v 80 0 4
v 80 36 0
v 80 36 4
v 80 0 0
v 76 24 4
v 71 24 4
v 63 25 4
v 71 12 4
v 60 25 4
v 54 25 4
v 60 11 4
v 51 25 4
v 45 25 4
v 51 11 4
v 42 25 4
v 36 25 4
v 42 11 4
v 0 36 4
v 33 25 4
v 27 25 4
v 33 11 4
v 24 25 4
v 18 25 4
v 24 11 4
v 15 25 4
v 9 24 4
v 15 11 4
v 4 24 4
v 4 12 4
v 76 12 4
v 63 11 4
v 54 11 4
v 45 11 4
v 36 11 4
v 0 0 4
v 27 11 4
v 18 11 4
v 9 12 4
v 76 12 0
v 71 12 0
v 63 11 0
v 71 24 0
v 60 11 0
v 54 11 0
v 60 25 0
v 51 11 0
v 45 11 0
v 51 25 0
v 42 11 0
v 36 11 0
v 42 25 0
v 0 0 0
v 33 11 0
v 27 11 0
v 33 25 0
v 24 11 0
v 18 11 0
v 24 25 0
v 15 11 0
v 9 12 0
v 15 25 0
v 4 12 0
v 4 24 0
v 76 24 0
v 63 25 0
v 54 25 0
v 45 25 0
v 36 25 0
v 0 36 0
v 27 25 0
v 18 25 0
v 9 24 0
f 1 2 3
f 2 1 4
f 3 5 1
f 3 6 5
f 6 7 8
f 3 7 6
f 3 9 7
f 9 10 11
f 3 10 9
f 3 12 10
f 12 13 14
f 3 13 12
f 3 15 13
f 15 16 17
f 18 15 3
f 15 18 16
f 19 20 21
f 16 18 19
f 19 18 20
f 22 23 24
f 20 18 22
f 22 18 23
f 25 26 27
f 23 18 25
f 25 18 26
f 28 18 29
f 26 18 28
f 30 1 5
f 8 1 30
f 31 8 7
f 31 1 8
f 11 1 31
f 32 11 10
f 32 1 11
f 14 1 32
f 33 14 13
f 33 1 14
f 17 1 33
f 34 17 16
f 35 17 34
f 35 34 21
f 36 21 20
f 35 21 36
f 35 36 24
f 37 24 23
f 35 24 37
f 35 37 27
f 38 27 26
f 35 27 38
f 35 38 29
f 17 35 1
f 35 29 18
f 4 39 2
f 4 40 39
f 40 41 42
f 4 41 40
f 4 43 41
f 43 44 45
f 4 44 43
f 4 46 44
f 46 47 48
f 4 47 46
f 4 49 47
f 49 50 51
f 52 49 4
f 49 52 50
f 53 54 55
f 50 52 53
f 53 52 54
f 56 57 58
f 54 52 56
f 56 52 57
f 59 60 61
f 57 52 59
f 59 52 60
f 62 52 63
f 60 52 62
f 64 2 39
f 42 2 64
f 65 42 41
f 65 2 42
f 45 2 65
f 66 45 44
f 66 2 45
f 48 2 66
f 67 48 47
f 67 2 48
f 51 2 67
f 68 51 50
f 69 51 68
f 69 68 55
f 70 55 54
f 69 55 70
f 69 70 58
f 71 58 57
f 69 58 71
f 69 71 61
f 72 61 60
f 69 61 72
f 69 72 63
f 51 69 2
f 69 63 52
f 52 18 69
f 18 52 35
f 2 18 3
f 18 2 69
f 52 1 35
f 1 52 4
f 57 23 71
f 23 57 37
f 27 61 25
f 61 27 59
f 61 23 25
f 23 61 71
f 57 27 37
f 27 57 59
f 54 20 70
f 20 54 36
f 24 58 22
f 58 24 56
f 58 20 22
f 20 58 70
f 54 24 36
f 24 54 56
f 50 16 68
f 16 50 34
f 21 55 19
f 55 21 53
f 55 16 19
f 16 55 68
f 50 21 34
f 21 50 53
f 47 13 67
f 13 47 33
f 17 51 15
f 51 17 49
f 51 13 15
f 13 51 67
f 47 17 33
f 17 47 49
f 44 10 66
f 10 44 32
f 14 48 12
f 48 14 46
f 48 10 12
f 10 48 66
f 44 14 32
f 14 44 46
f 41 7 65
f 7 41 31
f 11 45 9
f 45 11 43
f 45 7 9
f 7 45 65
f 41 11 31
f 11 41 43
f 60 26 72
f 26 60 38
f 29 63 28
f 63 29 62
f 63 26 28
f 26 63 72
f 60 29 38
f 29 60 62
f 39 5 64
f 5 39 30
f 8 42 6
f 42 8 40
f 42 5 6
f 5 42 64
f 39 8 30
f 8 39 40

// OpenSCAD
// Original MechIntel educational model. CC0-1.0. Units: mm.
// Not a standardized or load-rated component.
$fn=96;
length=80;
width=36;
base=4;
$fn=64;
difference(){union(){
translate([0,0,0]) cube([length,width,base]);
}
translate([15,11,-1]) cube([3,14,base+2]);
translate([24,11,-1]) cube([3,14,base+2]);
translate([33,11,-1]) cube([3,14,base+2]);
translate([42,11,-1]) cube([3,14,base+2]);
translate([51,11,-1]) cube([3,14,base+2]);
translate([60,11,-1]) cube([3,14,base+2]);
translate([4,12,-1]) cube([5,12,base+2]);
translate([71,12,-1]) cube([5,12,base+2]);
}
